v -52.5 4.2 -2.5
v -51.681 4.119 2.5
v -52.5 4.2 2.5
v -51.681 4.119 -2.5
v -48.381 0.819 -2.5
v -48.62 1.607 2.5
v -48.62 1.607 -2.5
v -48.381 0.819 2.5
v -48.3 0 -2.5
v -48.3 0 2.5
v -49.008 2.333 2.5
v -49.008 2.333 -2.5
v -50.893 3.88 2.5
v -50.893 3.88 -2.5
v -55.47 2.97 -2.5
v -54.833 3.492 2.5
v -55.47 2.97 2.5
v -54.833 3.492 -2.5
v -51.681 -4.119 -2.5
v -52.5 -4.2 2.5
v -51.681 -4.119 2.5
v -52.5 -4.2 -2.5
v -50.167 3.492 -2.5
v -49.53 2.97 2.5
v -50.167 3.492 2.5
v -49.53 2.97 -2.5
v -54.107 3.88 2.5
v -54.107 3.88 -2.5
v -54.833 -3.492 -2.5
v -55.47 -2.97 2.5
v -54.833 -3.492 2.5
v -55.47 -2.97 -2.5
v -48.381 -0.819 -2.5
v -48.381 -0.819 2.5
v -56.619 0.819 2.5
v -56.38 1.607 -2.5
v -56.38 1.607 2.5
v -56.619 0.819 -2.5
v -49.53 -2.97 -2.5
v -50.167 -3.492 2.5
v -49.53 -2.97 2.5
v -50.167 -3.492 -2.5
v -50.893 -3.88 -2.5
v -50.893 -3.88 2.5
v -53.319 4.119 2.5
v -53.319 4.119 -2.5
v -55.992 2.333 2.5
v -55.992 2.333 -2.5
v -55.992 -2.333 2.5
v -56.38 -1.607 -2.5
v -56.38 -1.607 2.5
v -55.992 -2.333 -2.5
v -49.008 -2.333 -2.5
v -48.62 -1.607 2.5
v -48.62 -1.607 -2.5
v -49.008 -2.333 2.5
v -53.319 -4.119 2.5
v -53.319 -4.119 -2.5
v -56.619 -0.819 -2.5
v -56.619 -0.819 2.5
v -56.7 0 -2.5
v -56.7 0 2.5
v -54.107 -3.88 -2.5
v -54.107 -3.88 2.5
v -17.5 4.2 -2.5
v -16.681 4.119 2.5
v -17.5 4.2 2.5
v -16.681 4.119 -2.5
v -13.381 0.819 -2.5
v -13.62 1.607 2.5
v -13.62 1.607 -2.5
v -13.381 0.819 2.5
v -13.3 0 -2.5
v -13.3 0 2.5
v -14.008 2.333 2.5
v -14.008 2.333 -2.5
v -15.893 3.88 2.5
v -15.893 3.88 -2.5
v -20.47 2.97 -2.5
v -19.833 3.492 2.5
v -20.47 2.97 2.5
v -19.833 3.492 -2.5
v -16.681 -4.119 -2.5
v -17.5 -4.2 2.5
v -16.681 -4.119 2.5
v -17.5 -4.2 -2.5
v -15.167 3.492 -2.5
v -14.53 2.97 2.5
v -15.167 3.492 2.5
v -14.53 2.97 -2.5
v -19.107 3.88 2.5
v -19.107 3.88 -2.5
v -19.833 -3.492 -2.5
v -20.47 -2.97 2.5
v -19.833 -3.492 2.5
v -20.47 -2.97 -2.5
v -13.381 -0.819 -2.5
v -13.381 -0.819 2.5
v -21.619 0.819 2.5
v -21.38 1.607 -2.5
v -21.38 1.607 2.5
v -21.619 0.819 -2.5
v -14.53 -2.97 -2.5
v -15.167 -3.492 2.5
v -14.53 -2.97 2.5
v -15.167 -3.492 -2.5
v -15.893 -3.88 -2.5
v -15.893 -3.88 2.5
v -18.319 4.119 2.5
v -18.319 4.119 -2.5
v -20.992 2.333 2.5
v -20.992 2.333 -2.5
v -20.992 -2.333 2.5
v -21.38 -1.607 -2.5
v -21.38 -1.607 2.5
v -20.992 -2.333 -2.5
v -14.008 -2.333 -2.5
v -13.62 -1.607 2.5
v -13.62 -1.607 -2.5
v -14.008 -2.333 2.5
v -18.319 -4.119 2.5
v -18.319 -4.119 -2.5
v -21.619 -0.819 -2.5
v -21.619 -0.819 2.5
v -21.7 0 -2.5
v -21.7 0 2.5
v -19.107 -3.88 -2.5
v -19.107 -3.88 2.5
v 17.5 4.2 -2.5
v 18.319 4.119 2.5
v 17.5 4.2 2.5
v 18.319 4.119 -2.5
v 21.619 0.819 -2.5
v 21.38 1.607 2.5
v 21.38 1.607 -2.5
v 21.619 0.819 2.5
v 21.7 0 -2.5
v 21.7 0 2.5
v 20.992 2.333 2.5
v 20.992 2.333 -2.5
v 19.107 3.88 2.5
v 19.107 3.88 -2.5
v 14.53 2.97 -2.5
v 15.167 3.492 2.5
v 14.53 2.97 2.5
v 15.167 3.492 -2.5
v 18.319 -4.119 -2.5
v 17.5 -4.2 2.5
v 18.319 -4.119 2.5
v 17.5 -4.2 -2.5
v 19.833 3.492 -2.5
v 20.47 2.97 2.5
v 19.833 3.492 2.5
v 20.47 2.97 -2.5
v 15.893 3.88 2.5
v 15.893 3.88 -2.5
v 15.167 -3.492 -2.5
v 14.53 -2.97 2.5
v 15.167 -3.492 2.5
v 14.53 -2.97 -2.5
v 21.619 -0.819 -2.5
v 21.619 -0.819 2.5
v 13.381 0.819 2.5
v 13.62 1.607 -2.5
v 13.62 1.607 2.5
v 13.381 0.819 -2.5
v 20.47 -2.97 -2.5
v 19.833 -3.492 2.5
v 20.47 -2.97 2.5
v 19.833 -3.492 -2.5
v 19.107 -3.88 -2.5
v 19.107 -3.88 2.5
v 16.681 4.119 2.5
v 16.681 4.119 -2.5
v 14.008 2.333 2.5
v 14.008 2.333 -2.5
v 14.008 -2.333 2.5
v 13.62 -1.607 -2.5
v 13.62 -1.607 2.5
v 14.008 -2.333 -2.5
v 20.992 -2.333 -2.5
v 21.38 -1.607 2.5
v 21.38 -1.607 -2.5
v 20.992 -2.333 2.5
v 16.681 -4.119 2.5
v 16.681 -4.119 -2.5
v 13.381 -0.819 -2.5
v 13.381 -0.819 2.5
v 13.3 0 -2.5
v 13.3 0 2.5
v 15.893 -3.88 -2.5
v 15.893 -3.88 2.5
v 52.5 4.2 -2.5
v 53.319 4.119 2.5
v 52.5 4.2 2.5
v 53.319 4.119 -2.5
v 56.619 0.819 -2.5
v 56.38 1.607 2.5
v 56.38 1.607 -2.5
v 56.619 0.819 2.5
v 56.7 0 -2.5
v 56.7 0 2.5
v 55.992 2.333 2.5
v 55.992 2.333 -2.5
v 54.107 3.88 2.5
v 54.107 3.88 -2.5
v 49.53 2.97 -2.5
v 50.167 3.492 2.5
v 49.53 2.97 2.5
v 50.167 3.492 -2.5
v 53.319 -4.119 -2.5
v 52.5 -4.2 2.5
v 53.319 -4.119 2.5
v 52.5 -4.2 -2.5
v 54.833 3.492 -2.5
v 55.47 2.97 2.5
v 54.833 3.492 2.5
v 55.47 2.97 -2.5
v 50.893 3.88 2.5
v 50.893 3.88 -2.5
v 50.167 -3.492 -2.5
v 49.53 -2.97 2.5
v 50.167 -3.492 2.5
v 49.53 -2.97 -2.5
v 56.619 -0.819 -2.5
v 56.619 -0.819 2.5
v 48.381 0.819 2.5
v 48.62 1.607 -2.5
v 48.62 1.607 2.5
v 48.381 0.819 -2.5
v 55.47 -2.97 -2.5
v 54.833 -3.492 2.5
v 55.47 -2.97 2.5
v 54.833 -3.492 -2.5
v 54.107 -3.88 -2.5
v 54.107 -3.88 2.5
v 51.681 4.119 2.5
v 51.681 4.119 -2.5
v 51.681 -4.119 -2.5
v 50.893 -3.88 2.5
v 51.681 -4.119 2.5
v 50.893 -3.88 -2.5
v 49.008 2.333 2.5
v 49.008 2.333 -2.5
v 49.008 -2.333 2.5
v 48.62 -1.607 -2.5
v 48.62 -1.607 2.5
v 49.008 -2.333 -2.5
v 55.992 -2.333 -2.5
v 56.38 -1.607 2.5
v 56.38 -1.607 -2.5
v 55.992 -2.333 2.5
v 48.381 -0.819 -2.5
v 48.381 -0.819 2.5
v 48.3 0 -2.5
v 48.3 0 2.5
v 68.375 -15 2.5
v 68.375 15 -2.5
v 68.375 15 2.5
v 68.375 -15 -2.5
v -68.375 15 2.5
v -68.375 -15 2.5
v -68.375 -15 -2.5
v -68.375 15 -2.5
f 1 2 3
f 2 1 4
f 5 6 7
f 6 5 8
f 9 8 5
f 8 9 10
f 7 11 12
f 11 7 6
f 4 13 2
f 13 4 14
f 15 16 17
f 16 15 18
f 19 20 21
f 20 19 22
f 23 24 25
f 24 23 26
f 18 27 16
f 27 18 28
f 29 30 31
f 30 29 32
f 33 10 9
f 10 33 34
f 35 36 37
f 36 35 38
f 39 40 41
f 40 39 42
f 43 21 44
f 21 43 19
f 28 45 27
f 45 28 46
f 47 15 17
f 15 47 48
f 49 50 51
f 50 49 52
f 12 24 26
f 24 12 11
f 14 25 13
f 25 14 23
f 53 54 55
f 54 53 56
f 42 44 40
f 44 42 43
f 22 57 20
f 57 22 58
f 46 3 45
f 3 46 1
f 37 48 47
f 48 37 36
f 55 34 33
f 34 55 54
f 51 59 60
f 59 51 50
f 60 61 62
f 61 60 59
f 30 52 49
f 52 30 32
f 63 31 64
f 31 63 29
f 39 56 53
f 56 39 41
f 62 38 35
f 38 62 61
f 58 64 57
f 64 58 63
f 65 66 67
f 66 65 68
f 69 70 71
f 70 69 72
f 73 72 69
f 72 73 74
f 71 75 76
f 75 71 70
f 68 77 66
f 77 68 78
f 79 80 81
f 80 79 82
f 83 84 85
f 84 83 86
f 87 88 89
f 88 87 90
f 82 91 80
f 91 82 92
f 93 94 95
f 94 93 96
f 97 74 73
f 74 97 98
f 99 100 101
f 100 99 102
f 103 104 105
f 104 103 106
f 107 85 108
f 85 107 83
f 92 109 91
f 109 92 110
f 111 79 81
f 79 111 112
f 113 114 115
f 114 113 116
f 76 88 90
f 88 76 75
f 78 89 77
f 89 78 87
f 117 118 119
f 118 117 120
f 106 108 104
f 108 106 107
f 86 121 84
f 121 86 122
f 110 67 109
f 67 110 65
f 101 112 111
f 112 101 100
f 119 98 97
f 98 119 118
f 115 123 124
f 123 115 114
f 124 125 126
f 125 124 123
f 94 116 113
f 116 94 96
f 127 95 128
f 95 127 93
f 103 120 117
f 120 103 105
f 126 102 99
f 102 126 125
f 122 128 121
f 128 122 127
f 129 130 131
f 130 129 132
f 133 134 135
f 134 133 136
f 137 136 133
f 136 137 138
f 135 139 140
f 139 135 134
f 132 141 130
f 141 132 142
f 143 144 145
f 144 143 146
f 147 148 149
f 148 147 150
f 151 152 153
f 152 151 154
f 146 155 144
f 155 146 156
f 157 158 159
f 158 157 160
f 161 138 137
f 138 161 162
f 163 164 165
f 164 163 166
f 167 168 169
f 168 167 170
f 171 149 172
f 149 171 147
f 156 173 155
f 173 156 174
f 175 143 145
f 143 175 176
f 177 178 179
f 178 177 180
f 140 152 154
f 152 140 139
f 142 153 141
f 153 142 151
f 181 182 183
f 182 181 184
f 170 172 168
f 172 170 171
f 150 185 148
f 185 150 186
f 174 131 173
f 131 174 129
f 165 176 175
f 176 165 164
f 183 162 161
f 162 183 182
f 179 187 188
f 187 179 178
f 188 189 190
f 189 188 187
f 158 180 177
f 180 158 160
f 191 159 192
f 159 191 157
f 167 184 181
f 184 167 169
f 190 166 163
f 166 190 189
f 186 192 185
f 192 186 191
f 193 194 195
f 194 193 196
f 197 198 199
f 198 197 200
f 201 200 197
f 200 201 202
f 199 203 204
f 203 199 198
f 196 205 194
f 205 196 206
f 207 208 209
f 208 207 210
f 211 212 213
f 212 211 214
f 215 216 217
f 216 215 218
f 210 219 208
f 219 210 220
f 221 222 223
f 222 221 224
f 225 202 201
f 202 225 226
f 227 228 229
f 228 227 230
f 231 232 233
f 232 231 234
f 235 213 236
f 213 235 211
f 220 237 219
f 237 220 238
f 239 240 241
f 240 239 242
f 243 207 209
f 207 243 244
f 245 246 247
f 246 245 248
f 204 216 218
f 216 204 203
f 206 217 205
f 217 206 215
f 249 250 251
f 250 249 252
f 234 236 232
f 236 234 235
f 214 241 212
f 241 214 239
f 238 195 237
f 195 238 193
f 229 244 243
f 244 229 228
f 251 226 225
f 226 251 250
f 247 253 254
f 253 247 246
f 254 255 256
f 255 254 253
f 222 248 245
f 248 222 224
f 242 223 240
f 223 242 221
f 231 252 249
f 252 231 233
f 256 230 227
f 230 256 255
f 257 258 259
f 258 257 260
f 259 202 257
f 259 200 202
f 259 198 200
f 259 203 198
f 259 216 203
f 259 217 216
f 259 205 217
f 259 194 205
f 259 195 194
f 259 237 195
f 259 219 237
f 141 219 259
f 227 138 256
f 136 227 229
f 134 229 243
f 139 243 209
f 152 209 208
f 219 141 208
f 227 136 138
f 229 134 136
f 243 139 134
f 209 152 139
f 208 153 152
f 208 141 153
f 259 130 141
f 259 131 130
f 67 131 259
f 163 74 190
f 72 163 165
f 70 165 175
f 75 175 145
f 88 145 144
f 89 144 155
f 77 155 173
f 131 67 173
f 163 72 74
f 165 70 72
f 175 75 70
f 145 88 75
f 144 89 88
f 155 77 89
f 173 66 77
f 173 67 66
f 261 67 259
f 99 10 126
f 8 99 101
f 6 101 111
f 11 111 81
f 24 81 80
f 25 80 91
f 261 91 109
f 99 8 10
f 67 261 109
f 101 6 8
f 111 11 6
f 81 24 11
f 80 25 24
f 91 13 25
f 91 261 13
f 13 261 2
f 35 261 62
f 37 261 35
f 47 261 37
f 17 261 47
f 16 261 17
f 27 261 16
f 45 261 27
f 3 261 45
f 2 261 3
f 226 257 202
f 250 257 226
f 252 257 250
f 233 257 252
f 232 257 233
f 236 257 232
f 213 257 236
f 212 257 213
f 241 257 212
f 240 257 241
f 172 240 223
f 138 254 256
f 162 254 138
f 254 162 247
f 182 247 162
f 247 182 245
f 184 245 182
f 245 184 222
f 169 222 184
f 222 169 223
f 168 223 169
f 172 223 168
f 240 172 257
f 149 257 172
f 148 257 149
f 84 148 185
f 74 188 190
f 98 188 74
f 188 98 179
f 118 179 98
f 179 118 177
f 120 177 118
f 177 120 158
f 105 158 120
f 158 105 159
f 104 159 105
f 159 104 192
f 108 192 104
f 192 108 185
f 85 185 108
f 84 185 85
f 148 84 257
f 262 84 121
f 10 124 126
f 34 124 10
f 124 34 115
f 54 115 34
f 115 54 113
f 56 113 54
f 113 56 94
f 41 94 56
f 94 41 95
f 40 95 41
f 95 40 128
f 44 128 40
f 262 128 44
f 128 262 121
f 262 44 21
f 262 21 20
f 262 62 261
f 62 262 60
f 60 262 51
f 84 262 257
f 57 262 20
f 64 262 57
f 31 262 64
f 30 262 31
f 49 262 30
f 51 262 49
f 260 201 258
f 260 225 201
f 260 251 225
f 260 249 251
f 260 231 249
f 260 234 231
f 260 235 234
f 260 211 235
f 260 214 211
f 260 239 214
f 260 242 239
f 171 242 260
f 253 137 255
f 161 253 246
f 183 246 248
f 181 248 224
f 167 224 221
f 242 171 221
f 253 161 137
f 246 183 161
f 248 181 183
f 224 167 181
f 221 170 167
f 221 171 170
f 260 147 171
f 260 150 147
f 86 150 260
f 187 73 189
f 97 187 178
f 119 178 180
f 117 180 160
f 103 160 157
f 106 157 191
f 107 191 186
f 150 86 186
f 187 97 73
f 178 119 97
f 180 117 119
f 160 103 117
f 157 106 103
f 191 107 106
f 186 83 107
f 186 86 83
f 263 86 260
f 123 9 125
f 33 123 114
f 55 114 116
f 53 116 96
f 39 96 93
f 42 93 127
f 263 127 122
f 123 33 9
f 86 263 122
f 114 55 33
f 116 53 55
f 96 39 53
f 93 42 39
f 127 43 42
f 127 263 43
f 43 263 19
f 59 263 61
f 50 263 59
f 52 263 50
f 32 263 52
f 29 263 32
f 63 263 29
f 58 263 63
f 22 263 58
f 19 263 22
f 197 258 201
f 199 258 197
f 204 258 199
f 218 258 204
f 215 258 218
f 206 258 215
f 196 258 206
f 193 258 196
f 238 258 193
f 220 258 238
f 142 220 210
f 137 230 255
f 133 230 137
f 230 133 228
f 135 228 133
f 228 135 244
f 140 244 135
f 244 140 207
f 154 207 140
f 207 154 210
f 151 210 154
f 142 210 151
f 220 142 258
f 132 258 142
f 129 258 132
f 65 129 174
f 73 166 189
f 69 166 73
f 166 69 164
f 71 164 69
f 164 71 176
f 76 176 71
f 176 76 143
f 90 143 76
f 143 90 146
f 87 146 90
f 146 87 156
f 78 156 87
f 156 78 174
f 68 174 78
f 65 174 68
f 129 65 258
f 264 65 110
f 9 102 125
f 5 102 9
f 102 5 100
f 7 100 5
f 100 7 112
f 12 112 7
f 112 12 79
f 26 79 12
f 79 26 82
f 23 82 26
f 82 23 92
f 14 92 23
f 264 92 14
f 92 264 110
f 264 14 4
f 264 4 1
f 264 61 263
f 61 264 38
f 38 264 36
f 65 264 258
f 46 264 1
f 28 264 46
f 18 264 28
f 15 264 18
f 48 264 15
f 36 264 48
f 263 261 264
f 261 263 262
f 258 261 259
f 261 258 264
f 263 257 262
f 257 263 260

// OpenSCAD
$fn = 32;

// ----------------------------------------------------------------------
// Hole bar, 4 x Ø8.4
// row layout, 15.875 mm edge offset
// ----------------------------------------------------------------------

// --- parameters (mm) ---
bar_w = 30;     // bar width (Y)
bar_t = 5;      // bar thickness (Z)
holes = 4;      // holes per row
hole_d = 8.4;   // hole diameter
edge = 15.875;  // offset from the bar end to the first hole
pitch = 35;     // pitch between neighbouring holes

// --- derived feature positions (mm) ---
span = (holes - 1) * pitch;   // = 105   distance between the end holes
bar_l = span + 2 * edge;      // = 136.75   overall bar length
start_x = -bar_l / 2 + edge;  // = -52.5   X of the first hole
feature_centers = [
  [start_x + 0 * pitch, 0],
  [start_x + 1 * pitch, 0],
  [start_x + 2 * pitch, 0],
  [start_x + 3 * pitch, 0]
];   // hole centres of the first row

// bar with one row of holes, drilled from feature_centers
difference() {
  translate([-bar_l / 2, -bar_w / 2, -bar_t / 2]) cube([bar_l, bar_w, bar_t]);
  for (centre = feature_centers)
    translate([centre[0], centre[1], 0])
      cylinder(d = hole_d, h = bar_t + 2, center = true);
}
